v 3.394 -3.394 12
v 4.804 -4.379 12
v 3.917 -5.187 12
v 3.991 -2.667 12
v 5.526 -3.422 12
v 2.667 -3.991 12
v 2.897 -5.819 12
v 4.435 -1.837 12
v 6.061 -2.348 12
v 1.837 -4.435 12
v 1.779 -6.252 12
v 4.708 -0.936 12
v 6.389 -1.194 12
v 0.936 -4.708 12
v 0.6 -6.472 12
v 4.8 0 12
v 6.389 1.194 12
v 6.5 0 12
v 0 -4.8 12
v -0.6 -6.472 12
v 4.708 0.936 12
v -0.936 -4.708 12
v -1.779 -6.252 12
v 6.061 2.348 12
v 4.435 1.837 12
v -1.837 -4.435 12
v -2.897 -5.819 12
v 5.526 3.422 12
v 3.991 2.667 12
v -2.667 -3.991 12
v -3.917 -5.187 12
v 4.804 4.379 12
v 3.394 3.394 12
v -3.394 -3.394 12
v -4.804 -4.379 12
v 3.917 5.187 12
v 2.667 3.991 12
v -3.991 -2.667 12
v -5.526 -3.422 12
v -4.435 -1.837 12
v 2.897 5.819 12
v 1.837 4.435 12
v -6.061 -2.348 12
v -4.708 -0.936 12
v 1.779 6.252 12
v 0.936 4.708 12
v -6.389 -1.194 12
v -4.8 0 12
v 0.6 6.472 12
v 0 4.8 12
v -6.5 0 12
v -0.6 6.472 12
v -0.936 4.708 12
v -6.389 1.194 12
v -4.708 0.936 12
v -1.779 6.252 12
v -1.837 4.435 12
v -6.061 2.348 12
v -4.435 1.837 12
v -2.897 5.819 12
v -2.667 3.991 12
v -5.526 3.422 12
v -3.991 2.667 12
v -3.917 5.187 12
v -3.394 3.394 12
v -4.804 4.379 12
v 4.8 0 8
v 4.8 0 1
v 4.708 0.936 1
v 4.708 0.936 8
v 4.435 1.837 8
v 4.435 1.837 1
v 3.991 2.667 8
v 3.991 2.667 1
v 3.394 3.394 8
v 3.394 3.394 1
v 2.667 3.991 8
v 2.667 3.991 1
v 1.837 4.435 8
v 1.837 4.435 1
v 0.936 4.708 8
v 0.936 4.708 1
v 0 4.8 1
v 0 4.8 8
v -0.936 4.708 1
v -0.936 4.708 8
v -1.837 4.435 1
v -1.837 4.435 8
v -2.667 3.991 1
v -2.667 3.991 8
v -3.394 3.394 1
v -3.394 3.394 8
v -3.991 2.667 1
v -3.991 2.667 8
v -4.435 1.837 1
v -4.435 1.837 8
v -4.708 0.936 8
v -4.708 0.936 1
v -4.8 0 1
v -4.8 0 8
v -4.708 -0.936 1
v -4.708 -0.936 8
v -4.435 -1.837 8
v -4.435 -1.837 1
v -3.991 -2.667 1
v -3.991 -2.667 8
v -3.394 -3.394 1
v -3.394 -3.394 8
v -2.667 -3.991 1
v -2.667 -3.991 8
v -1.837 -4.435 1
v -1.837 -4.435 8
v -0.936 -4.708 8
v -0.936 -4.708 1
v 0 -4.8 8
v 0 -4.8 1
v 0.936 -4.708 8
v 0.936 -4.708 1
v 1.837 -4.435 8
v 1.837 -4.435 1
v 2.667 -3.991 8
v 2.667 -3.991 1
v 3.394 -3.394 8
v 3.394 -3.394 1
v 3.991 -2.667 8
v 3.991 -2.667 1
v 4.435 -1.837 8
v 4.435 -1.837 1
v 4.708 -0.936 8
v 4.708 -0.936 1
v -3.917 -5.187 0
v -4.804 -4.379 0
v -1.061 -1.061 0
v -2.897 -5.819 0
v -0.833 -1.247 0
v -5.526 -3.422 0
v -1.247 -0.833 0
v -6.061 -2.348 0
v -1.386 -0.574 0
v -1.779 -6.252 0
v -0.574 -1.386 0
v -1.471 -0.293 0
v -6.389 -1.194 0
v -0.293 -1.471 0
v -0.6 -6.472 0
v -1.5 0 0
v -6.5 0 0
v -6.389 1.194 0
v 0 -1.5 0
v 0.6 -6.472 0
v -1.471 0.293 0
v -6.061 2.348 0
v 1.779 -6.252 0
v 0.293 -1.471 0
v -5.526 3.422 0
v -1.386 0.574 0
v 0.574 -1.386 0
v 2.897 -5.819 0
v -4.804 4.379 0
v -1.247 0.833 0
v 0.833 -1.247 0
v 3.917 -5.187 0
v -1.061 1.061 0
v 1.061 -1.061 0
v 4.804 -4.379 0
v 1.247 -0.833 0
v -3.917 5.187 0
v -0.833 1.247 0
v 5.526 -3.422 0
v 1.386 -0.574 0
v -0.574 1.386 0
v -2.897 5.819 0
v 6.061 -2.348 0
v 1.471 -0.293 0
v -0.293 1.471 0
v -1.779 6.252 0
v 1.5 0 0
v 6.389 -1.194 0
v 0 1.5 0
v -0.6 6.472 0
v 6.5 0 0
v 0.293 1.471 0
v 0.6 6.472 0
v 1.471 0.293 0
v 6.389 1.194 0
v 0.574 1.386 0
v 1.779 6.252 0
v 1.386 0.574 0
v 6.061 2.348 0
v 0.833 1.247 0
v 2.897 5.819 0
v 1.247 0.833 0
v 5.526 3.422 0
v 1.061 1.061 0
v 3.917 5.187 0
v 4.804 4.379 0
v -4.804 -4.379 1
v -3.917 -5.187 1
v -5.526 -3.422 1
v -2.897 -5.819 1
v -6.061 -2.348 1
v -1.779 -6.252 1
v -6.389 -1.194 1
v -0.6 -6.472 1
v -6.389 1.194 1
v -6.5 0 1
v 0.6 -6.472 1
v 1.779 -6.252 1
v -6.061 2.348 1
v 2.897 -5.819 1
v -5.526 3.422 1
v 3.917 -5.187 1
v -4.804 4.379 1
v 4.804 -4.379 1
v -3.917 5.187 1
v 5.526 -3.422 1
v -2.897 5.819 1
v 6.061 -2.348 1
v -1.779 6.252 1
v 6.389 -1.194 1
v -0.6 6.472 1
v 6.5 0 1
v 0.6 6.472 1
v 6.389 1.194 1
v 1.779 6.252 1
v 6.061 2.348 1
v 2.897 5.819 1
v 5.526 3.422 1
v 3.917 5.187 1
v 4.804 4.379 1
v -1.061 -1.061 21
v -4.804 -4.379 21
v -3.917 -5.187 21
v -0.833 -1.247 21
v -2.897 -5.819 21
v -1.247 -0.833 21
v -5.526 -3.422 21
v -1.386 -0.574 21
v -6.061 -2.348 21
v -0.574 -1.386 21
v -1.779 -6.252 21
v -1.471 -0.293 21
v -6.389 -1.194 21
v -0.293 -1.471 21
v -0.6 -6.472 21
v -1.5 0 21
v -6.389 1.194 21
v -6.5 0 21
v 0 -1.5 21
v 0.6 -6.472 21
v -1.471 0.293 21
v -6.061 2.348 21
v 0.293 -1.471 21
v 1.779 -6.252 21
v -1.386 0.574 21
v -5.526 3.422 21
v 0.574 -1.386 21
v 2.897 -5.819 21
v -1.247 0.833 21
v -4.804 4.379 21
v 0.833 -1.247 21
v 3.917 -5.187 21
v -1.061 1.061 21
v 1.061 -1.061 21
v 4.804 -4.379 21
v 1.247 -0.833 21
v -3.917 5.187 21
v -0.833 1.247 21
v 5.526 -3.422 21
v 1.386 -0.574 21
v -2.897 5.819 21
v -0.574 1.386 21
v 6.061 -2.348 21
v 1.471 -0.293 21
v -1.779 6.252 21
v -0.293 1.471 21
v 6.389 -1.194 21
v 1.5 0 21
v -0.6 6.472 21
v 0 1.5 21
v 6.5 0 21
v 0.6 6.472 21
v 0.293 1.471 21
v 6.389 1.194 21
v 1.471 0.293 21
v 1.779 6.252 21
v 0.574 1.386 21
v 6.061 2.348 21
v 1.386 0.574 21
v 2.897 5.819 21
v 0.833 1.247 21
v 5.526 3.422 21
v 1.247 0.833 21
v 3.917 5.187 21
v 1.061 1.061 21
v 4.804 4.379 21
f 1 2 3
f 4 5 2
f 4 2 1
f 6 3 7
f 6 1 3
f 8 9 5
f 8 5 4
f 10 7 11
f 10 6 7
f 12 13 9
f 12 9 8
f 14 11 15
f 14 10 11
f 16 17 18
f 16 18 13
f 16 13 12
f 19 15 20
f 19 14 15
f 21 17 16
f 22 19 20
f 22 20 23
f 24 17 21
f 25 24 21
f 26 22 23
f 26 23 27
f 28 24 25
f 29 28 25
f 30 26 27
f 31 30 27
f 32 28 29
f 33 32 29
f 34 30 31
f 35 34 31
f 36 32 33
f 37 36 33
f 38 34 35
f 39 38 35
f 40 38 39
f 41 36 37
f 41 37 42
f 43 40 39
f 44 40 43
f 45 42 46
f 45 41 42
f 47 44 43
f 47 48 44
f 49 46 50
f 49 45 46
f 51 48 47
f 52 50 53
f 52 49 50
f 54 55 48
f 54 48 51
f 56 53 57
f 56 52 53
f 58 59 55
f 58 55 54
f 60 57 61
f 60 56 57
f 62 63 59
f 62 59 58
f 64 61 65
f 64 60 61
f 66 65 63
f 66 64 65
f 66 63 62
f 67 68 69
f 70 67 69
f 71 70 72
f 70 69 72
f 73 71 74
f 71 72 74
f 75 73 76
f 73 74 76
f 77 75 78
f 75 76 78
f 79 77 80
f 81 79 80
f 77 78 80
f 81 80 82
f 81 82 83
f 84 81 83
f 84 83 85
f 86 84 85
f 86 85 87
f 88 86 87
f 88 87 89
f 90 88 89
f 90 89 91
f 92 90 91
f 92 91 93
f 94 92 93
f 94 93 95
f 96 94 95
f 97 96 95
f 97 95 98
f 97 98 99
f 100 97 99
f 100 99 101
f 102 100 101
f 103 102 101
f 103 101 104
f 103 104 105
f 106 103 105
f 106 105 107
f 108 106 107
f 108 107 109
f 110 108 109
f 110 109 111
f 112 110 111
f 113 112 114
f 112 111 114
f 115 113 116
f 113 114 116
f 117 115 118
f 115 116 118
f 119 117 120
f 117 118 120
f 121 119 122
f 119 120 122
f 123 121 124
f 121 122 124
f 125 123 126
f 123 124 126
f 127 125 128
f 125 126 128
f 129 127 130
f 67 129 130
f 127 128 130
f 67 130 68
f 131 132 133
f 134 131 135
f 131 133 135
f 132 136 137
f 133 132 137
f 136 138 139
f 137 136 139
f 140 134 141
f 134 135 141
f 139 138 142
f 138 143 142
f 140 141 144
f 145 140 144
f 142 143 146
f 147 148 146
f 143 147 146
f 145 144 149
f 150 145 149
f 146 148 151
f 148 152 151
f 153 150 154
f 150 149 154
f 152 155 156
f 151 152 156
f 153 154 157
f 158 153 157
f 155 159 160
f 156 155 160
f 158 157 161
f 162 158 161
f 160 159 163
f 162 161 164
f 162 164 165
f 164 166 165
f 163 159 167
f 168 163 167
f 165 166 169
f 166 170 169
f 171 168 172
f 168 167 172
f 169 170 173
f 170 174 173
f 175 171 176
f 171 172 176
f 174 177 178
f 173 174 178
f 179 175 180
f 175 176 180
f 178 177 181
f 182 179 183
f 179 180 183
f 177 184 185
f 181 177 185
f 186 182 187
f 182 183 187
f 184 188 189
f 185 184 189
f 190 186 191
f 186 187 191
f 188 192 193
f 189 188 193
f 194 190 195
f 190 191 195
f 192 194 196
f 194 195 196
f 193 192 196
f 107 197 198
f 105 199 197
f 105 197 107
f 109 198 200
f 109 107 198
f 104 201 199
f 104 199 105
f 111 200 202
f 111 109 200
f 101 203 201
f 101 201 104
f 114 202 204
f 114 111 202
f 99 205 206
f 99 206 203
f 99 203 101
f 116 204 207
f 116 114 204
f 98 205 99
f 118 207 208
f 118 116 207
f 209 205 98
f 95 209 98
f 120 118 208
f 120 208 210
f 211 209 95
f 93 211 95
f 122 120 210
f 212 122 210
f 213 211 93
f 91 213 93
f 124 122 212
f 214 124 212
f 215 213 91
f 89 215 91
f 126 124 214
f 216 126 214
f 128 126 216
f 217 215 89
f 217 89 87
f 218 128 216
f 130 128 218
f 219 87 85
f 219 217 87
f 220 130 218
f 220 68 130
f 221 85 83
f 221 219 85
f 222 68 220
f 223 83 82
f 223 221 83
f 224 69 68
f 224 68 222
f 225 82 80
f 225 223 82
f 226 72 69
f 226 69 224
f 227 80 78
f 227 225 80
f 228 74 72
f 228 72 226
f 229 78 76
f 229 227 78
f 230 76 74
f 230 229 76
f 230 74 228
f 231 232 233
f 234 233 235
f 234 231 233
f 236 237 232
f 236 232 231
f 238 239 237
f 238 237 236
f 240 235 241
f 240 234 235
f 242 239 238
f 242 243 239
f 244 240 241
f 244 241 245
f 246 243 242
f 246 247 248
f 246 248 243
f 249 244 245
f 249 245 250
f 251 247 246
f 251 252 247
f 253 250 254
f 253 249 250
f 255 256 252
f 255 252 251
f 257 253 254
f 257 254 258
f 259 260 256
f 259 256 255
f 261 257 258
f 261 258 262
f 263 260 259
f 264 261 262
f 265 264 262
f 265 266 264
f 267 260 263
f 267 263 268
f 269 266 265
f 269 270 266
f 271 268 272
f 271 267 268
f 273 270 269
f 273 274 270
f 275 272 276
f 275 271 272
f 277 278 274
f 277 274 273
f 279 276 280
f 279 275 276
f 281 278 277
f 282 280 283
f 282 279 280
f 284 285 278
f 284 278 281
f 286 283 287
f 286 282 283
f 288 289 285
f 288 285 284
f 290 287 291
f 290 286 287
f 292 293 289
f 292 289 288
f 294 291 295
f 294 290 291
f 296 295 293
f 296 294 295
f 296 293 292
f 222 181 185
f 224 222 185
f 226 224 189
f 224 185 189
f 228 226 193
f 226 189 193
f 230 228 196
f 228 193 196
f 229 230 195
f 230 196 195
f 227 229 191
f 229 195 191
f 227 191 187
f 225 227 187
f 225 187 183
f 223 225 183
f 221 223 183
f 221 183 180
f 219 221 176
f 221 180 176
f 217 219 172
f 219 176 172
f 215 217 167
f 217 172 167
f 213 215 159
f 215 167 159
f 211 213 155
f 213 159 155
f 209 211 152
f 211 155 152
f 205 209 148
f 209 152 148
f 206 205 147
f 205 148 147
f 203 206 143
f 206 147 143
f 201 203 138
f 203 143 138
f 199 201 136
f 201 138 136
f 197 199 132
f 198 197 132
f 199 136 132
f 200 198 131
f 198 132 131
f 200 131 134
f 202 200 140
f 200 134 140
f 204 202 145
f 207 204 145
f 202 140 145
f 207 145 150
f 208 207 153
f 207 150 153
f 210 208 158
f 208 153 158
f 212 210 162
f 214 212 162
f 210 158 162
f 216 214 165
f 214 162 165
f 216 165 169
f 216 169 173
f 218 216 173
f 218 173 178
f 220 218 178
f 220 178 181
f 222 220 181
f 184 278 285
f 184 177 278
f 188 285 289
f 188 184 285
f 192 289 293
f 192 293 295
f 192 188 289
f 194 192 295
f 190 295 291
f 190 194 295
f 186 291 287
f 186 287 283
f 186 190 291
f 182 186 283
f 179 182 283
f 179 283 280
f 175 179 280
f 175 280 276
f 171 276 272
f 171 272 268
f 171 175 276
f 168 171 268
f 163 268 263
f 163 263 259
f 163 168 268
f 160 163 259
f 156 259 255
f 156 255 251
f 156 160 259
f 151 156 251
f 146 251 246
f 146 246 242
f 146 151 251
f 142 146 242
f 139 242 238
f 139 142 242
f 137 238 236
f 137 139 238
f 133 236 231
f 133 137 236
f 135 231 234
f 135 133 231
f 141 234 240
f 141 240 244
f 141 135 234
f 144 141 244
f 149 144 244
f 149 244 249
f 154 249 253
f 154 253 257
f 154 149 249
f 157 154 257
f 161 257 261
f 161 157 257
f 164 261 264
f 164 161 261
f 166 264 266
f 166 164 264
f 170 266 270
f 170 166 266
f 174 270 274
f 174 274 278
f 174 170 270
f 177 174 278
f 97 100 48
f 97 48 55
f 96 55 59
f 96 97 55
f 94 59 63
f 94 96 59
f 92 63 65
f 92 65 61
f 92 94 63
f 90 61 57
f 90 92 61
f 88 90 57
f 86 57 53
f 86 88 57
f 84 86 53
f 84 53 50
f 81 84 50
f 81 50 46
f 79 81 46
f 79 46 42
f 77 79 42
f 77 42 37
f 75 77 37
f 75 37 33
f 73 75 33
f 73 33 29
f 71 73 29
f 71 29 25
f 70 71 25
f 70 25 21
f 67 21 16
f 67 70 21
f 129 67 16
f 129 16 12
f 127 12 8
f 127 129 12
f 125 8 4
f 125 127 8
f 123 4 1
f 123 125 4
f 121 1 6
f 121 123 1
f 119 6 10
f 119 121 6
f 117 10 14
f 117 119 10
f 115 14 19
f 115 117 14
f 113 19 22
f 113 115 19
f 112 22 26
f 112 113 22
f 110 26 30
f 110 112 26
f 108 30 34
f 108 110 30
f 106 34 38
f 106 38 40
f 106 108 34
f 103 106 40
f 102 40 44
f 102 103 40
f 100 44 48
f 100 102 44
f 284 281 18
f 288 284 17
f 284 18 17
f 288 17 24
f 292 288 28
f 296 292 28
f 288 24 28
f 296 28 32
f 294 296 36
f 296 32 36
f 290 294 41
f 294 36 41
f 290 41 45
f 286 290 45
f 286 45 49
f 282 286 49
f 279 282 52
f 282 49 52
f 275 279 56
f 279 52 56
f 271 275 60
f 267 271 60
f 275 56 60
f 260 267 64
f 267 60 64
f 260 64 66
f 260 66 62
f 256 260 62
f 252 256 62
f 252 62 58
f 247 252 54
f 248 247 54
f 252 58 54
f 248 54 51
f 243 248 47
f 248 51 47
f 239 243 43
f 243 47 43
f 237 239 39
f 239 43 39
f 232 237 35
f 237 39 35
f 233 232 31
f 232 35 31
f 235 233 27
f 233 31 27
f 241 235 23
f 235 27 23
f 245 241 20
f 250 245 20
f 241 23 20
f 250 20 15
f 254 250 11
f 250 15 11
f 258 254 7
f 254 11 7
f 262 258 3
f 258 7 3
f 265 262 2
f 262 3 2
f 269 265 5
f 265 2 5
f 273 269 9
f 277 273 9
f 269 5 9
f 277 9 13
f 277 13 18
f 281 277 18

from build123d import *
from build123d.topology import SkipClean

# Parameters (mm, degrees)
SKETCH1_R               = 6.5
SKETCH1_R_2             = 1.5
BOSS_EXTRUDE1_DEPTH     = 1
SKETCH2_R               = 4.8
SKETCH2_R_2             = 1.5
BOSS_EXTRUDE2_DEPTH     = 7
SKETCH3_R               = 6.5
SKETCH3_R_2             = 1.5
BOSS_EXTRUDE3_DEPTH     = 1
CROQUIS2_R              = 6.5
CROQUIS2_R_2            = 1.5
SALIENTE_EXTRUIR1_DEPTH = 12
CROQUIS3_R              = 6.5
CROQUIS3_R_2            = 4.8
CORTAR_EXTRUIR2_DEPTH   = 4


with BuildPart() as part:
    # Sketch1 → Boss-Extrude1 (new body)
    with BuildSketch(Plane.XY):
        Circle(SKETCH1_R)
        Circle(SKETCH1_R_2, mode=Mode.SUBTRACT)
    extrude(amount=BOSS_EXTRUDE1_DEPTH)

    # Sketch2 → Boss-Extrude2 (add)
    with BuildSketch(Plane.XY.offset(1)):
        Circle(SKETCH2_R)
        Circle(SKETCH2_R_2, mode=Mode.SUBTRACT)
    extrude(amount=BOSS_EXTRUDE2_DEPTH)

    # Sketch3 → Boss-Extrude3 (add)
    with BuildSketch(Plane.XY.offset(8)):
        Circle(SKETCH3_R)
        Circle(SKETCH3_R_2, mode=Mode.SUBTRACT)
    extrude(amount=BOSS_EXTRUDE3_DEPTH)

    # Croquis2 → Saliente-Extruir1 (add)
    with BuildSketch(Plane.XY.offset(9)):
        Circle(CROQUIS2_R)
        Circle(CROQUIS2_R_2, mode=Mode.SUBTRACT)
    extrude(amount=SALIENTE_EXTRUIR1_DEPTH)

    # Croquis3 → Cortar-Extruir2 (cut)
    with SkipClean():  # the faces are left unmerged after this step: merging them gives an invalid solid
        with BuildSketch(Plane(origin=(0, 0, 8), x_dir=(-1, 0, 0), z_dir=(0, 0, -1))):
            Circle(CROQUIS3_R)
            Circle(CROQUIS3_R_2, mode=Mode.SUBTRACT)
        extrude(amount=-CORTAR_EXTRUIR2_DEPTH, mode=Mode.SUBTRACT)
    add(part.part.scale(1), mode=Mode.REPLACE)  # the faces are merged on a copy


solid = part.part
